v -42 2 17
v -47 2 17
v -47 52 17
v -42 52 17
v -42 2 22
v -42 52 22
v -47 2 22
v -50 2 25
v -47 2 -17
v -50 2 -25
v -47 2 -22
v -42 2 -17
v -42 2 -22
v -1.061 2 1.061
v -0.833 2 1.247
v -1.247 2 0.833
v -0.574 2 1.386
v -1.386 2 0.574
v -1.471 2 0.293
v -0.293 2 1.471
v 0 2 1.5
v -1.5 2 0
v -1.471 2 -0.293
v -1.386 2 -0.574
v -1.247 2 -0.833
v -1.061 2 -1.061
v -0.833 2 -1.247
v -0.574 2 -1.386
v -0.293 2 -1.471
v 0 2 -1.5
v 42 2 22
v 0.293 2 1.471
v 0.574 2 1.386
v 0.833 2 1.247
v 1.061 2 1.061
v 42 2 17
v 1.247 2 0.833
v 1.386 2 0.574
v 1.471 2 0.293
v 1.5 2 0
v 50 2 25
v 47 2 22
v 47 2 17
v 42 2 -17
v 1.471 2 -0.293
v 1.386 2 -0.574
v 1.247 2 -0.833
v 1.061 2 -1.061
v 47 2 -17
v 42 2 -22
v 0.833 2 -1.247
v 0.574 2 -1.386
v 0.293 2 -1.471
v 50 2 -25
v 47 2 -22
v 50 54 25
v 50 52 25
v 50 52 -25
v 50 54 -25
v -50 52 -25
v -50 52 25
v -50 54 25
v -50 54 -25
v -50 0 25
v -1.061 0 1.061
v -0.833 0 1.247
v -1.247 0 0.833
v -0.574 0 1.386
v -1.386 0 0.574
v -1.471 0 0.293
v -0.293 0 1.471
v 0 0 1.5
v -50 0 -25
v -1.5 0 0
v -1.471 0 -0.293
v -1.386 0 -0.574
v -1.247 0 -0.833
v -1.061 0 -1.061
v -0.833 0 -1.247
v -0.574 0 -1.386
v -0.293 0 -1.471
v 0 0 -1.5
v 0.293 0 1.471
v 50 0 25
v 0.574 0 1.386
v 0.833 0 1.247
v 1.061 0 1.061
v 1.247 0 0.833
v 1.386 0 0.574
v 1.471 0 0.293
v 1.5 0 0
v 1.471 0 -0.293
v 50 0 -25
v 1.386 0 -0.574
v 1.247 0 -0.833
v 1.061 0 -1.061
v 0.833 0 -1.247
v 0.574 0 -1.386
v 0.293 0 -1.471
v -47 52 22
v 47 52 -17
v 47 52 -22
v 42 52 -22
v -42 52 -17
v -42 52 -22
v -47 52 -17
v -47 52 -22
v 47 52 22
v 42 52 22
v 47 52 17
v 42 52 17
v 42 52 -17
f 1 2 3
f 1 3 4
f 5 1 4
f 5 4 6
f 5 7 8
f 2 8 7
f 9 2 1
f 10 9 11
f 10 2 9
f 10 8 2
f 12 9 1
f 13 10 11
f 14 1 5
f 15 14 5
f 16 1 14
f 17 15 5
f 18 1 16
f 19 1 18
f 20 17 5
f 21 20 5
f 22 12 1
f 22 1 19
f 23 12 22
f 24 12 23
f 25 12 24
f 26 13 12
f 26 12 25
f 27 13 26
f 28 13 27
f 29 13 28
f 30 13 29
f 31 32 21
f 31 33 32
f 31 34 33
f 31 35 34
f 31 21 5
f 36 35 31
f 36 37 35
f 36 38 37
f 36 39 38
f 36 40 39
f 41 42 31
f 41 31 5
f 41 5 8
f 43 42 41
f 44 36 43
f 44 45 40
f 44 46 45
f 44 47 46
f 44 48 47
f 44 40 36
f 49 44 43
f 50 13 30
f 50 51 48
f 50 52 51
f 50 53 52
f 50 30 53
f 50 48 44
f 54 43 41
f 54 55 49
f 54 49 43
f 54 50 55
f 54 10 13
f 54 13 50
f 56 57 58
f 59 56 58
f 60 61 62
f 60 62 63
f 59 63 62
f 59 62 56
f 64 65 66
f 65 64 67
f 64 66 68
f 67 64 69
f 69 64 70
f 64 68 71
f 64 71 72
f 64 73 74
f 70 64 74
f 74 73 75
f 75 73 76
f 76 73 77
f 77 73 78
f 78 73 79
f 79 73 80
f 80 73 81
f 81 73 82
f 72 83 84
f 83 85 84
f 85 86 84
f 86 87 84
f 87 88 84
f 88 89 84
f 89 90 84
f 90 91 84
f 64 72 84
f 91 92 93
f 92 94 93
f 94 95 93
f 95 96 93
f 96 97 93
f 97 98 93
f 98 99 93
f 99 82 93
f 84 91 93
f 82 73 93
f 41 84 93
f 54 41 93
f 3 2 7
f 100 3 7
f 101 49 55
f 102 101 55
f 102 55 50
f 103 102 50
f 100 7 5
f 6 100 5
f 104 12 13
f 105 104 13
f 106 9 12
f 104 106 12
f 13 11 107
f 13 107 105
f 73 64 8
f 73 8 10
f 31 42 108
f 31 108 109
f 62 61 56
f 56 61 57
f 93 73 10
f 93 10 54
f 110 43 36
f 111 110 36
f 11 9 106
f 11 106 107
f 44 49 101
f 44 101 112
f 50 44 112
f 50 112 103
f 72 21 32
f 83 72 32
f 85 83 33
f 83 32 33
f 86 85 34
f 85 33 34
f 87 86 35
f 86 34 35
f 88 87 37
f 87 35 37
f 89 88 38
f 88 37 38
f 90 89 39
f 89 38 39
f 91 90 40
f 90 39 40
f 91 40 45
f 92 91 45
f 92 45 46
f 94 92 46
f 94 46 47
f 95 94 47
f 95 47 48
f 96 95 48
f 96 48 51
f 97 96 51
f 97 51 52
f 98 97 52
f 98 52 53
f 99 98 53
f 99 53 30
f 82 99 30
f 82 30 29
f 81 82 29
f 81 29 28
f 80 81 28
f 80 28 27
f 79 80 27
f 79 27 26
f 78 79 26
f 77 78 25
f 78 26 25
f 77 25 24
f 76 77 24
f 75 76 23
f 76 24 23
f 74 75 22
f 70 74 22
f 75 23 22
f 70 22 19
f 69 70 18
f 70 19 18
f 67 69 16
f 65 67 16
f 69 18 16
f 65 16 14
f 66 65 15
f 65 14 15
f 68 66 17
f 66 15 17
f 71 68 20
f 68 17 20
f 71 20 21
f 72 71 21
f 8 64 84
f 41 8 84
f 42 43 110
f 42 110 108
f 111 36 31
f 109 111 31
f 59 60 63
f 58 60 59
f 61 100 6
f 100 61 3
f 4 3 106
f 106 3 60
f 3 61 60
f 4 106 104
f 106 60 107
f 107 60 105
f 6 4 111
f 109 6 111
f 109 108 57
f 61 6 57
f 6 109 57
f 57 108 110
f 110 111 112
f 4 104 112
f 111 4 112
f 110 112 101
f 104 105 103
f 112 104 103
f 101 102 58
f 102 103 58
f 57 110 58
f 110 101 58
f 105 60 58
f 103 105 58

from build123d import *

# Parameters (mm, degrees)
SKETCH2_W                                  = 100
SKETCH2_H                                  = 50
BOSS_EXTRUDE1_DEPTH                        = 2
CUT_EXTRUDE1_REACH                         = 57.937
SKETCH3_R                                  = 1.5
SKETCH4_W                                  = 5
SKETCH4_H                                  = 5
BOSS_EXTRUDE2_DEPTH                        = 50
MIRROR1_AT_THE_SECOND_PLANE_COPY_1_SKETC_W = 5
MIRROR1_AT_THE_SECOND_PLANE_COPY_1_SKETC_H = 5
MIRROR1_AT_THE_SECOND_PLANE_COPY_1_DEPTH   = 50
SKETCH5_W                                  = 100
SKETCH5_H                                  = 50
BOSS_EXTRUDE3_DEPTH                        = 2


with BuildPart() as part:
    # Sketch2 → Boss-Extrude1 (new body)
    with BuildSketch(Plane(origin=(0, 0, 0), x_dir=(1, 0, 0), z_dir=(0, 1, 0))):
        Rectangle(SKETCH2_W, SKETCH2_H)
    extrude(amount=BOSS_EXTRUDE1_DEPTH)

    # Sketch3 → Cut-Extrude1 (cut, up to next)
    with BuildSketch(Plane(origin=(0, 2, 0), x_dir=(1, 0, 0), z_dir=(0, 1, 0)), mode=Mode.PRIVATE) as cut_extrude1_sk1:
        with Locations(Location((0, 0, 0), (0, 0, 270))):
            Circle(SKETCH3_R)
    cut_extrude1_tool1 = extrude(cut_extrude1_sk1.sketch, amount=-CUT_EXTRUDE1_REACH, mode=Mode.PRIVATE) & part.part
    add(cut_extrude1_tool1.solids().sort_by_distance((0, 2, 0))[0], mode=Mode.SUBTRACT)

    # Sketch4 → Boss-Extrude2 (add)
    with BuildSketch(Plane(origin=(0, 2, 0), x_dir=(1, 0, 0), z_dir=(0, 1, 0))):
        with Locations((-44.5, 19.5)):
            Rectangle(SKETCH4_W, SKETCH4_H)
    boss_extrude2 = extrude(amount=BOSS_EXTRUDE2_DEPTH)

    # Mirror1: Boss-Extrude2 across plane
    add(boss_extrude2.mirror(Plane.XY))

    # Mirror1 at the second plane: Boss-Extrude2 across plane
    add(boss_extrude2.mirror(Plane(origin=(0, 0, 0), x_dir=(0, 0, 1), z_dir=(1, 0, 0))))

    # Mirror1 at the second plane copy 1 sketc → Mirror1 at the second plane copy 1 (add)
    with BuildSketch(Plane(origin=(0, 2, 0), x_dir=(-1, 0, 0), z_dir=(0, 1, 0))):
        with Locations((-44.5, 19.5)):
            Rectangle(MIRROR1_AT_THE_SECOND_PLANE_COPY_1_SKETC_W, MIRROR1_AT_THE_SECOND_PLANE_COPY_1_SKETC_H)
    extrude(amount=MIRROR1_AT_THE_SECOND_PLANE_COPY_1_DEPTH)

    # Sketch5 → Boss-Extrude3 (add)
    with BuildSketch(Plane(origin=(0, 52, 0), x_dir=(1, 0, 0), z_dir=(0, 1, 0))):
        Rectangle(SKETCH5_W, SKETCH5_H)
    extrude(amount=BOSS_EXTRUDE3_DEPTH)


solid = part.part
